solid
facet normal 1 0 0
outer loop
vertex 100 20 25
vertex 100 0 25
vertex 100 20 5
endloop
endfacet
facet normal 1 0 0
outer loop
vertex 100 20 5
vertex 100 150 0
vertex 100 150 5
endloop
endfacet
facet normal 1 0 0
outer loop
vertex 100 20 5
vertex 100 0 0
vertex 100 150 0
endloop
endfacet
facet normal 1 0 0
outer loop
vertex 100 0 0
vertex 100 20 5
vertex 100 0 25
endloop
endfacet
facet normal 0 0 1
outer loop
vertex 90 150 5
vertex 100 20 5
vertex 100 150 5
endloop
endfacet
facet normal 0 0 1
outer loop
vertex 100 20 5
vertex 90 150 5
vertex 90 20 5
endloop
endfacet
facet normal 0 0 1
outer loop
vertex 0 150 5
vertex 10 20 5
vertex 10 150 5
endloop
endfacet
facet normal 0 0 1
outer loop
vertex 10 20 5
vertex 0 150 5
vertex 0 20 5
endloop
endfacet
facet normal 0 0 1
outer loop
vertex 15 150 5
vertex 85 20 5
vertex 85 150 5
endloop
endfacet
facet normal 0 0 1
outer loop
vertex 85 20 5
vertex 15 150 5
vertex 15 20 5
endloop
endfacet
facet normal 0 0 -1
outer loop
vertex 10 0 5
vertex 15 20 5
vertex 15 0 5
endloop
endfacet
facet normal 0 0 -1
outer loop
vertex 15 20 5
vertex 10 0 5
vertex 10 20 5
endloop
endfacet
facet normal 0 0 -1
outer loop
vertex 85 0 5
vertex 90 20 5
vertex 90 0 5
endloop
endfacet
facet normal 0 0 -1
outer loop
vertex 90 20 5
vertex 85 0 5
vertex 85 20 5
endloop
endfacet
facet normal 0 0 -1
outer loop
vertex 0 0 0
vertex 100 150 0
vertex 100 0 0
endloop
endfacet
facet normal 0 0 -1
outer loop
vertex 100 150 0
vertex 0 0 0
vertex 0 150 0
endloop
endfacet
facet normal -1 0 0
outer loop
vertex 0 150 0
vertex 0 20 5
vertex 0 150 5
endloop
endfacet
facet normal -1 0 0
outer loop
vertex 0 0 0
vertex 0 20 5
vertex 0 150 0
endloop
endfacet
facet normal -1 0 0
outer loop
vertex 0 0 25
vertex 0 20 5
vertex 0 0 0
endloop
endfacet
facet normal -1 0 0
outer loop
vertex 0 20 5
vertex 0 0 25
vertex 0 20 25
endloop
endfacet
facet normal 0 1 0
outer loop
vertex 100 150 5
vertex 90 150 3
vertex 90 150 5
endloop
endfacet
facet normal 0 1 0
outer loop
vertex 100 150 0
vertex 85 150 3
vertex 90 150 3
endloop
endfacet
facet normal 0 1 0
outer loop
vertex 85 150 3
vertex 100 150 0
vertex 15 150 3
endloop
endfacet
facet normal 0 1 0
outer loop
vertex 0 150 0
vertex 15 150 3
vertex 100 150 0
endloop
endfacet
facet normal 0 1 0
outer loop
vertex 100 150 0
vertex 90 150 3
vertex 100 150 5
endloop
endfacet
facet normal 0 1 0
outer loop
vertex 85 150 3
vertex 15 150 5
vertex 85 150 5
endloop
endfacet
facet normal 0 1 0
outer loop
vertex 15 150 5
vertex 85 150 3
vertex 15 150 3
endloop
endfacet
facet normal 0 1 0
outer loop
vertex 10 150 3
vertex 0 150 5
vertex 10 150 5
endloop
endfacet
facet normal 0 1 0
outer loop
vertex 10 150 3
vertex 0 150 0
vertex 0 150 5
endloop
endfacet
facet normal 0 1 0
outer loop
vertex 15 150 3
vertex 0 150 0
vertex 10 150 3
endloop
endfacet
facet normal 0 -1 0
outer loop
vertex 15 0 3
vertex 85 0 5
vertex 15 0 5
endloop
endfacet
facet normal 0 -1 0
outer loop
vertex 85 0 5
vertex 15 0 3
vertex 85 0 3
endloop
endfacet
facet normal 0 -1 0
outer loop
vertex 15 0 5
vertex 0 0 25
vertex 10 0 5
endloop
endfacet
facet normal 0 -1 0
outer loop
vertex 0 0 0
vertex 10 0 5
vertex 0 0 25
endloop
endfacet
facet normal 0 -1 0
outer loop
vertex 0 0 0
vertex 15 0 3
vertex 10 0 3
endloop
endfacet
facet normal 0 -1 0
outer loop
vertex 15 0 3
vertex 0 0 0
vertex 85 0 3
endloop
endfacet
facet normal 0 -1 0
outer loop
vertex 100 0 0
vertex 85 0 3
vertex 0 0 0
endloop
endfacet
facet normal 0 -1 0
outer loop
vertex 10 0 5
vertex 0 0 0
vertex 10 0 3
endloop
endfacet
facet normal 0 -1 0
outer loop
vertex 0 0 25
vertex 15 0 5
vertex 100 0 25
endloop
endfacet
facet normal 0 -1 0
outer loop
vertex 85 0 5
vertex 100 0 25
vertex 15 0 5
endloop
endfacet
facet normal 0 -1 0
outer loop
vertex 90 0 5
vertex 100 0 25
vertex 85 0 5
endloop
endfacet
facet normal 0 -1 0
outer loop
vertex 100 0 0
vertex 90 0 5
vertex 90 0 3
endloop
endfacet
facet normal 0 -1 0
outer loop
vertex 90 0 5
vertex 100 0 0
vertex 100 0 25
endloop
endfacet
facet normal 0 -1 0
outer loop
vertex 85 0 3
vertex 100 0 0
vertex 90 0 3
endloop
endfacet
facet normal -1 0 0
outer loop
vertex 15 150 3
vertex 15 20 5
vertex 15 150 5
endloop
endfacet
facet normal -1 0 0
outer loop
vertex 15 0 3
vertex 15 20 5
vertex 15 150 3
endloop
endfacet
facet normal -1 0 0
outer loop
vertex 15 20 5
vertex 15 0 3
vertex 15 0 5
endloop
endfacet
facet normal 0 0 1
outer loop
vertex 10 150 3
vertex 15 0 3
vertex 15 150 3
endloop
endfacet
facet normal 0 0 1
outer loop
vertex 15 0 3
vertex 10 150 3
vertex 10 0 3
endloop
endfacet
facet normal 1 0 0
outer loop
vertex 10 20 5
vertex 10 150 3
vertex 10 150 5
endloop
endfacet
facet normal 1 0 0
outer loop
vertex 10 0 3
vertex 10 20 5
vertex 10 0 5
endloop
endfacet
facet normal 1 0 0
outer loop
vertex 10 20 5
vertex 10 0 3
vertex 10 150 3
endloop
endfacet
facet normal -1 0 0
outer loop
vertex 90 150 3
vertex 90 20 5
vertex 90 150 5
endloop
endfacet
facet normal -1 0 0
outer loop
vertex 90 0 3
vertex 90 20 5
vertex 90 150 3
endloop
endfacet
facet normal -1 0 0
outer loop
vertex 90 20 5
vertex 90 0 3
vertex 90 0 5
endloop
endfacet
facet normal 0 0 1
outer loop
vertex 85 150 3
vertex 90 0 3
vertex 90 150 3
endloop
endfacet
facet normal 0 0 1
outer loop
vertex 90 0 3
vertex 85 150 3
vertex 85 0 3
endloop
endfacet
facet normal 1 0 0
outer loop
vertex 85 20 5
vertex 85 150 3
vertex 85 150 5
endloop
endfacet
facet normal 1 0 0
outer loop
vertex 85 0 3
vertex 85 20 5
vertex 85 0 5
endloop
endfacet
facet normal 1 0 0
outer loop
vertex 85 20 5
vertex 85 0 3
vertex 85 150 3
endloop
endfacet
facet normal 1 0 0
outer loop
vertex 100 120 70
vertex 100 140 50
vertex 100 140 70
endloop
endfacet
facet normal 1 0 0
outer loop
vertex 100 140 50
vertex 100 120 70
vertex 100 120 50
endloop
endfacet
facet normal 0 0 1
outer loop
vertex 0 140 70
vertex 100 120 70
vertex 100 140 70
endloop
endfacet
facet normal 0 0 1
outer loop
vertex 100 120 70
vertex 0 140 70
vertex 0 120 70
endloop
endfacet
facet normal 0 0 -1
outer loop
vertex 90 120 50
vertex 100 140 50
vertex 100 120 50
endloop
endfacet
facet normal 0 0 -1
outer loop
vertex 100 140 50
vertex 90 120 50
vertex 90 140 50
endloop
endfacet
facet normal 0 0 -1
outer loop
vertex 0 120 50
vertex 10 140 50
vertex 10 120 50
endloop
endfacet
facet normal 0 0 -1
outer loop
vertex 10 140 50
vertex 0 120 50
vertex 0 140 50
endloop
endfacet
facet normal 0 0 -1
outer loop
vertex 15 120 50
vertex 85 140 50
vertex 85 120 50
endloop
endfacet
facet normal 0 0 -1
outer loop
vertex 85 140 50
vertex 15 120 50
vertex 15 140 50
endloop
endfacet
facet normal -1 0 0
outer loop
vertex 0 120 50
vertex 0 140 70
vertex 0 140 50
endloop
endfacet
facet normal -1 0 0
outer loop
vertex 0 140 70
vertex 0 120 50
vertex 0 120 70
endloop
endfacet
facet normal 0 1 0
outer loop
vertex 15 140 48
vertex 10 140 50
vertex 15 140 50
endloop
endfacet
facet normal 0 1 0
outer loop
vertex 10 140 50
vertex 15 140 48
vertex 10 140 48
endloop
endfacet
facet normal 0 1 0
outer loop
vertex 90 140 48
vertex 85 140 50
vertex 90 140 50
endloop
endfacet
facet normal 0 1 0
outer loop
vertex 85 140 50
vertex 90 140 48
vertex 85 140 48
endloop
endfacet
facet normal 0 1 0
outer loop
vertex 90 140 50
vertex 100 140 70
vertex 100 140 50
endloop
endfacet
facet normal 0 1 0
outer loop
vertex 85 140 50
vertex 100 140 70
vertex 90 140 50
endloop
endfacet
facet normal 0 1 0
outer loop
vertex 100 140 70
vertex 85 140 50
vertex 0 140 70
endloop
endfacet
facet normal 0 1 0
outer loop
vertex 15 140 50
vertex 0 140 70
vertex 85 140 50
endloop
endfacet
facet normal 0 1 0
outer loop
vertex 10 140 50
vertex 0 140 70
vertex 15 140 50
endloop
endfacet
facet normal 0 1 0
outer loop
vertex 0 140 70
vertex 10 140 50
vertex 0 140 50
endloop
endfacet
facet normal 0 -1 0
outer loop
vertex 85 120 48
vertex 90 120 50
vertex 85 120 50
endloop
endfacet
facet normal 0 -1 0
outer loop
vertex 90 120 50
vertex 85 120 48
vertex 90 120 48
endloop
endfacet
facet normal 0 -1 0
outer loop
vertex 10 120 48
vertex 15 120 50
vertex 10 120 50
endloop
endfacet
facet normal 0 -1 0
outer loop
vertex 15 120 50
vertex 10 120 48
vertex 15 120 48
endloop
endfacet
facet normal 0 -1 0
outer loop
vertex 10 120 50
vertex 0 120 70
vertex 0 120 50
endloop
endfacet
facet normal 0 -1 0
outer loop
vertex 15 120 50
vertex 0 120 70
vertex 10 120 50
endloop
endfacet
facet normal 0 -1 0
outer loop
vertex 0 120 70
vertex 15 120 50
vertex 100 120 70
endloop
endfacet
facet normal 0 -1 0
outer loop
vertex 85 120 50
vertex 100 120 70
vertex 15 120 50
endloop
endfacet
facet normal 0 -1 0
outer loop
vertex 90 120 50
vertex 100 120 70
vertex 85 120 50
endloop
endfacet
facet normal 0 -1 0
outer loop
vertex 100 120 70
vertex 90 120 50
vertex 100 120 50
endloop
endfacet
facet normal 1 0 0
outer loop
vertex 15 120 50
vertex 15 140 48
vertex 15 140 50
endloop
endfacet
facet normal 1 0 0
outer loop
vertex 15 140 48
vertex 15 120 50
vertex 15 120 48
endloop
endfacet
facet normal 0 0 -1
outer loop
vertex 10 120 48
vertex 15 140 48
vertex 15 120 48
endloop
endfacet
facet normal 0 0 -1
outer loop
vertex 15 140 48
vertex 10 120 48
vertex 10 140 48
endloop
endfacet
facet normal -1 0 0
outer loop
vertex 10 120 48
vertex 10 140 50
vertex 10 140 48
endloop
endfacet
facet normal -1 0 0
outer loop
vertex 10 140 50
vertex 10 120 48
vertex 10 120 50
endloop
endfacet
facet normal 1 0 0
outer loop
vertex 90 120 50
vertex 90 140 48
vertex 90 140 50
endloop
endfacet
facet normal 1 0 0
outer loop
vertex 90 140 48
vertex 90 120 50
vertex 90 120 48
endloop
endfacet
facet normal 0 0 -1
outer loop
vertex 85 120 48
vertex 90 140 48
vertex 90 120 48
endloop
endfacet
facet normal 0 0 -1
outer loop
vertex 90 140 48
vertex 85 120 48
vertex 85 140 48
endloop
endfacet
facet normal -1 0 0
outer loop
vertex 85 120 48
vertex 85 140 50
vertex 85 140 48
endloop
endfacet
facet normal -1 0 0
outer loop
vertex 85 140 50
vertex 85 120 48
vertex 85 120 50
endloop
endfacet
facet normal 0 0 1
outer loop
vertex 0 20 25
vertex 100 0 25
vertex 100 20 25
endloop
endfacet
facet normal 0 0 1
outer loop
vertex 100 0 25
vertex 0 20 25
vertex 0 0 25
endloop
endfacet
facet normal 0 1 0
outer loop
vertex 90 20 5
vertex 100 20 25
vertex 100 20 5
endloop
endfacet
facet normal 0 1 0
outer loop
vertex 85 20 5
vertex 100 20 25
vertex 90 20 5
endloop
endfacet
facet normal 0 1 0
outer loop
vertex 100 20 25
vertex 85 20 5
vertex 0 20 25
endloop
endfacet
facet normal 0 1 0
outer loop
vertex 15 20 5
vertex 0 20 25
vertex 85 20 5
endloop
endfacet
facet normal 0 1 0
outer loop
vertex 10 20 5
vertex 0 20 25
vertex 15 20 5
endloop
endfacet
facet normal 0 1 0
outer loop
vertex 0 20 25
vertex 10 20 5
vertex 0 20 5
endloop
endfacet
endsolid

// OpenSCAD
translate([0,0,5]) cube([100,20,20]); // end butt

 difference() {
cube([100,150,5]); // main stage

translate([10,0,3]) cube([5,150,5]); // rail
translate([85,0,3]) cube([5,150,5]); // rail
}




translate([0,120,50]) union() {
    cube([100,20,20]); // end butt
    translate([10,0,-2]) cube([5,20,5]); // rail
    translate([85,0,-2]) cube([5,20,5]); // rail
}
